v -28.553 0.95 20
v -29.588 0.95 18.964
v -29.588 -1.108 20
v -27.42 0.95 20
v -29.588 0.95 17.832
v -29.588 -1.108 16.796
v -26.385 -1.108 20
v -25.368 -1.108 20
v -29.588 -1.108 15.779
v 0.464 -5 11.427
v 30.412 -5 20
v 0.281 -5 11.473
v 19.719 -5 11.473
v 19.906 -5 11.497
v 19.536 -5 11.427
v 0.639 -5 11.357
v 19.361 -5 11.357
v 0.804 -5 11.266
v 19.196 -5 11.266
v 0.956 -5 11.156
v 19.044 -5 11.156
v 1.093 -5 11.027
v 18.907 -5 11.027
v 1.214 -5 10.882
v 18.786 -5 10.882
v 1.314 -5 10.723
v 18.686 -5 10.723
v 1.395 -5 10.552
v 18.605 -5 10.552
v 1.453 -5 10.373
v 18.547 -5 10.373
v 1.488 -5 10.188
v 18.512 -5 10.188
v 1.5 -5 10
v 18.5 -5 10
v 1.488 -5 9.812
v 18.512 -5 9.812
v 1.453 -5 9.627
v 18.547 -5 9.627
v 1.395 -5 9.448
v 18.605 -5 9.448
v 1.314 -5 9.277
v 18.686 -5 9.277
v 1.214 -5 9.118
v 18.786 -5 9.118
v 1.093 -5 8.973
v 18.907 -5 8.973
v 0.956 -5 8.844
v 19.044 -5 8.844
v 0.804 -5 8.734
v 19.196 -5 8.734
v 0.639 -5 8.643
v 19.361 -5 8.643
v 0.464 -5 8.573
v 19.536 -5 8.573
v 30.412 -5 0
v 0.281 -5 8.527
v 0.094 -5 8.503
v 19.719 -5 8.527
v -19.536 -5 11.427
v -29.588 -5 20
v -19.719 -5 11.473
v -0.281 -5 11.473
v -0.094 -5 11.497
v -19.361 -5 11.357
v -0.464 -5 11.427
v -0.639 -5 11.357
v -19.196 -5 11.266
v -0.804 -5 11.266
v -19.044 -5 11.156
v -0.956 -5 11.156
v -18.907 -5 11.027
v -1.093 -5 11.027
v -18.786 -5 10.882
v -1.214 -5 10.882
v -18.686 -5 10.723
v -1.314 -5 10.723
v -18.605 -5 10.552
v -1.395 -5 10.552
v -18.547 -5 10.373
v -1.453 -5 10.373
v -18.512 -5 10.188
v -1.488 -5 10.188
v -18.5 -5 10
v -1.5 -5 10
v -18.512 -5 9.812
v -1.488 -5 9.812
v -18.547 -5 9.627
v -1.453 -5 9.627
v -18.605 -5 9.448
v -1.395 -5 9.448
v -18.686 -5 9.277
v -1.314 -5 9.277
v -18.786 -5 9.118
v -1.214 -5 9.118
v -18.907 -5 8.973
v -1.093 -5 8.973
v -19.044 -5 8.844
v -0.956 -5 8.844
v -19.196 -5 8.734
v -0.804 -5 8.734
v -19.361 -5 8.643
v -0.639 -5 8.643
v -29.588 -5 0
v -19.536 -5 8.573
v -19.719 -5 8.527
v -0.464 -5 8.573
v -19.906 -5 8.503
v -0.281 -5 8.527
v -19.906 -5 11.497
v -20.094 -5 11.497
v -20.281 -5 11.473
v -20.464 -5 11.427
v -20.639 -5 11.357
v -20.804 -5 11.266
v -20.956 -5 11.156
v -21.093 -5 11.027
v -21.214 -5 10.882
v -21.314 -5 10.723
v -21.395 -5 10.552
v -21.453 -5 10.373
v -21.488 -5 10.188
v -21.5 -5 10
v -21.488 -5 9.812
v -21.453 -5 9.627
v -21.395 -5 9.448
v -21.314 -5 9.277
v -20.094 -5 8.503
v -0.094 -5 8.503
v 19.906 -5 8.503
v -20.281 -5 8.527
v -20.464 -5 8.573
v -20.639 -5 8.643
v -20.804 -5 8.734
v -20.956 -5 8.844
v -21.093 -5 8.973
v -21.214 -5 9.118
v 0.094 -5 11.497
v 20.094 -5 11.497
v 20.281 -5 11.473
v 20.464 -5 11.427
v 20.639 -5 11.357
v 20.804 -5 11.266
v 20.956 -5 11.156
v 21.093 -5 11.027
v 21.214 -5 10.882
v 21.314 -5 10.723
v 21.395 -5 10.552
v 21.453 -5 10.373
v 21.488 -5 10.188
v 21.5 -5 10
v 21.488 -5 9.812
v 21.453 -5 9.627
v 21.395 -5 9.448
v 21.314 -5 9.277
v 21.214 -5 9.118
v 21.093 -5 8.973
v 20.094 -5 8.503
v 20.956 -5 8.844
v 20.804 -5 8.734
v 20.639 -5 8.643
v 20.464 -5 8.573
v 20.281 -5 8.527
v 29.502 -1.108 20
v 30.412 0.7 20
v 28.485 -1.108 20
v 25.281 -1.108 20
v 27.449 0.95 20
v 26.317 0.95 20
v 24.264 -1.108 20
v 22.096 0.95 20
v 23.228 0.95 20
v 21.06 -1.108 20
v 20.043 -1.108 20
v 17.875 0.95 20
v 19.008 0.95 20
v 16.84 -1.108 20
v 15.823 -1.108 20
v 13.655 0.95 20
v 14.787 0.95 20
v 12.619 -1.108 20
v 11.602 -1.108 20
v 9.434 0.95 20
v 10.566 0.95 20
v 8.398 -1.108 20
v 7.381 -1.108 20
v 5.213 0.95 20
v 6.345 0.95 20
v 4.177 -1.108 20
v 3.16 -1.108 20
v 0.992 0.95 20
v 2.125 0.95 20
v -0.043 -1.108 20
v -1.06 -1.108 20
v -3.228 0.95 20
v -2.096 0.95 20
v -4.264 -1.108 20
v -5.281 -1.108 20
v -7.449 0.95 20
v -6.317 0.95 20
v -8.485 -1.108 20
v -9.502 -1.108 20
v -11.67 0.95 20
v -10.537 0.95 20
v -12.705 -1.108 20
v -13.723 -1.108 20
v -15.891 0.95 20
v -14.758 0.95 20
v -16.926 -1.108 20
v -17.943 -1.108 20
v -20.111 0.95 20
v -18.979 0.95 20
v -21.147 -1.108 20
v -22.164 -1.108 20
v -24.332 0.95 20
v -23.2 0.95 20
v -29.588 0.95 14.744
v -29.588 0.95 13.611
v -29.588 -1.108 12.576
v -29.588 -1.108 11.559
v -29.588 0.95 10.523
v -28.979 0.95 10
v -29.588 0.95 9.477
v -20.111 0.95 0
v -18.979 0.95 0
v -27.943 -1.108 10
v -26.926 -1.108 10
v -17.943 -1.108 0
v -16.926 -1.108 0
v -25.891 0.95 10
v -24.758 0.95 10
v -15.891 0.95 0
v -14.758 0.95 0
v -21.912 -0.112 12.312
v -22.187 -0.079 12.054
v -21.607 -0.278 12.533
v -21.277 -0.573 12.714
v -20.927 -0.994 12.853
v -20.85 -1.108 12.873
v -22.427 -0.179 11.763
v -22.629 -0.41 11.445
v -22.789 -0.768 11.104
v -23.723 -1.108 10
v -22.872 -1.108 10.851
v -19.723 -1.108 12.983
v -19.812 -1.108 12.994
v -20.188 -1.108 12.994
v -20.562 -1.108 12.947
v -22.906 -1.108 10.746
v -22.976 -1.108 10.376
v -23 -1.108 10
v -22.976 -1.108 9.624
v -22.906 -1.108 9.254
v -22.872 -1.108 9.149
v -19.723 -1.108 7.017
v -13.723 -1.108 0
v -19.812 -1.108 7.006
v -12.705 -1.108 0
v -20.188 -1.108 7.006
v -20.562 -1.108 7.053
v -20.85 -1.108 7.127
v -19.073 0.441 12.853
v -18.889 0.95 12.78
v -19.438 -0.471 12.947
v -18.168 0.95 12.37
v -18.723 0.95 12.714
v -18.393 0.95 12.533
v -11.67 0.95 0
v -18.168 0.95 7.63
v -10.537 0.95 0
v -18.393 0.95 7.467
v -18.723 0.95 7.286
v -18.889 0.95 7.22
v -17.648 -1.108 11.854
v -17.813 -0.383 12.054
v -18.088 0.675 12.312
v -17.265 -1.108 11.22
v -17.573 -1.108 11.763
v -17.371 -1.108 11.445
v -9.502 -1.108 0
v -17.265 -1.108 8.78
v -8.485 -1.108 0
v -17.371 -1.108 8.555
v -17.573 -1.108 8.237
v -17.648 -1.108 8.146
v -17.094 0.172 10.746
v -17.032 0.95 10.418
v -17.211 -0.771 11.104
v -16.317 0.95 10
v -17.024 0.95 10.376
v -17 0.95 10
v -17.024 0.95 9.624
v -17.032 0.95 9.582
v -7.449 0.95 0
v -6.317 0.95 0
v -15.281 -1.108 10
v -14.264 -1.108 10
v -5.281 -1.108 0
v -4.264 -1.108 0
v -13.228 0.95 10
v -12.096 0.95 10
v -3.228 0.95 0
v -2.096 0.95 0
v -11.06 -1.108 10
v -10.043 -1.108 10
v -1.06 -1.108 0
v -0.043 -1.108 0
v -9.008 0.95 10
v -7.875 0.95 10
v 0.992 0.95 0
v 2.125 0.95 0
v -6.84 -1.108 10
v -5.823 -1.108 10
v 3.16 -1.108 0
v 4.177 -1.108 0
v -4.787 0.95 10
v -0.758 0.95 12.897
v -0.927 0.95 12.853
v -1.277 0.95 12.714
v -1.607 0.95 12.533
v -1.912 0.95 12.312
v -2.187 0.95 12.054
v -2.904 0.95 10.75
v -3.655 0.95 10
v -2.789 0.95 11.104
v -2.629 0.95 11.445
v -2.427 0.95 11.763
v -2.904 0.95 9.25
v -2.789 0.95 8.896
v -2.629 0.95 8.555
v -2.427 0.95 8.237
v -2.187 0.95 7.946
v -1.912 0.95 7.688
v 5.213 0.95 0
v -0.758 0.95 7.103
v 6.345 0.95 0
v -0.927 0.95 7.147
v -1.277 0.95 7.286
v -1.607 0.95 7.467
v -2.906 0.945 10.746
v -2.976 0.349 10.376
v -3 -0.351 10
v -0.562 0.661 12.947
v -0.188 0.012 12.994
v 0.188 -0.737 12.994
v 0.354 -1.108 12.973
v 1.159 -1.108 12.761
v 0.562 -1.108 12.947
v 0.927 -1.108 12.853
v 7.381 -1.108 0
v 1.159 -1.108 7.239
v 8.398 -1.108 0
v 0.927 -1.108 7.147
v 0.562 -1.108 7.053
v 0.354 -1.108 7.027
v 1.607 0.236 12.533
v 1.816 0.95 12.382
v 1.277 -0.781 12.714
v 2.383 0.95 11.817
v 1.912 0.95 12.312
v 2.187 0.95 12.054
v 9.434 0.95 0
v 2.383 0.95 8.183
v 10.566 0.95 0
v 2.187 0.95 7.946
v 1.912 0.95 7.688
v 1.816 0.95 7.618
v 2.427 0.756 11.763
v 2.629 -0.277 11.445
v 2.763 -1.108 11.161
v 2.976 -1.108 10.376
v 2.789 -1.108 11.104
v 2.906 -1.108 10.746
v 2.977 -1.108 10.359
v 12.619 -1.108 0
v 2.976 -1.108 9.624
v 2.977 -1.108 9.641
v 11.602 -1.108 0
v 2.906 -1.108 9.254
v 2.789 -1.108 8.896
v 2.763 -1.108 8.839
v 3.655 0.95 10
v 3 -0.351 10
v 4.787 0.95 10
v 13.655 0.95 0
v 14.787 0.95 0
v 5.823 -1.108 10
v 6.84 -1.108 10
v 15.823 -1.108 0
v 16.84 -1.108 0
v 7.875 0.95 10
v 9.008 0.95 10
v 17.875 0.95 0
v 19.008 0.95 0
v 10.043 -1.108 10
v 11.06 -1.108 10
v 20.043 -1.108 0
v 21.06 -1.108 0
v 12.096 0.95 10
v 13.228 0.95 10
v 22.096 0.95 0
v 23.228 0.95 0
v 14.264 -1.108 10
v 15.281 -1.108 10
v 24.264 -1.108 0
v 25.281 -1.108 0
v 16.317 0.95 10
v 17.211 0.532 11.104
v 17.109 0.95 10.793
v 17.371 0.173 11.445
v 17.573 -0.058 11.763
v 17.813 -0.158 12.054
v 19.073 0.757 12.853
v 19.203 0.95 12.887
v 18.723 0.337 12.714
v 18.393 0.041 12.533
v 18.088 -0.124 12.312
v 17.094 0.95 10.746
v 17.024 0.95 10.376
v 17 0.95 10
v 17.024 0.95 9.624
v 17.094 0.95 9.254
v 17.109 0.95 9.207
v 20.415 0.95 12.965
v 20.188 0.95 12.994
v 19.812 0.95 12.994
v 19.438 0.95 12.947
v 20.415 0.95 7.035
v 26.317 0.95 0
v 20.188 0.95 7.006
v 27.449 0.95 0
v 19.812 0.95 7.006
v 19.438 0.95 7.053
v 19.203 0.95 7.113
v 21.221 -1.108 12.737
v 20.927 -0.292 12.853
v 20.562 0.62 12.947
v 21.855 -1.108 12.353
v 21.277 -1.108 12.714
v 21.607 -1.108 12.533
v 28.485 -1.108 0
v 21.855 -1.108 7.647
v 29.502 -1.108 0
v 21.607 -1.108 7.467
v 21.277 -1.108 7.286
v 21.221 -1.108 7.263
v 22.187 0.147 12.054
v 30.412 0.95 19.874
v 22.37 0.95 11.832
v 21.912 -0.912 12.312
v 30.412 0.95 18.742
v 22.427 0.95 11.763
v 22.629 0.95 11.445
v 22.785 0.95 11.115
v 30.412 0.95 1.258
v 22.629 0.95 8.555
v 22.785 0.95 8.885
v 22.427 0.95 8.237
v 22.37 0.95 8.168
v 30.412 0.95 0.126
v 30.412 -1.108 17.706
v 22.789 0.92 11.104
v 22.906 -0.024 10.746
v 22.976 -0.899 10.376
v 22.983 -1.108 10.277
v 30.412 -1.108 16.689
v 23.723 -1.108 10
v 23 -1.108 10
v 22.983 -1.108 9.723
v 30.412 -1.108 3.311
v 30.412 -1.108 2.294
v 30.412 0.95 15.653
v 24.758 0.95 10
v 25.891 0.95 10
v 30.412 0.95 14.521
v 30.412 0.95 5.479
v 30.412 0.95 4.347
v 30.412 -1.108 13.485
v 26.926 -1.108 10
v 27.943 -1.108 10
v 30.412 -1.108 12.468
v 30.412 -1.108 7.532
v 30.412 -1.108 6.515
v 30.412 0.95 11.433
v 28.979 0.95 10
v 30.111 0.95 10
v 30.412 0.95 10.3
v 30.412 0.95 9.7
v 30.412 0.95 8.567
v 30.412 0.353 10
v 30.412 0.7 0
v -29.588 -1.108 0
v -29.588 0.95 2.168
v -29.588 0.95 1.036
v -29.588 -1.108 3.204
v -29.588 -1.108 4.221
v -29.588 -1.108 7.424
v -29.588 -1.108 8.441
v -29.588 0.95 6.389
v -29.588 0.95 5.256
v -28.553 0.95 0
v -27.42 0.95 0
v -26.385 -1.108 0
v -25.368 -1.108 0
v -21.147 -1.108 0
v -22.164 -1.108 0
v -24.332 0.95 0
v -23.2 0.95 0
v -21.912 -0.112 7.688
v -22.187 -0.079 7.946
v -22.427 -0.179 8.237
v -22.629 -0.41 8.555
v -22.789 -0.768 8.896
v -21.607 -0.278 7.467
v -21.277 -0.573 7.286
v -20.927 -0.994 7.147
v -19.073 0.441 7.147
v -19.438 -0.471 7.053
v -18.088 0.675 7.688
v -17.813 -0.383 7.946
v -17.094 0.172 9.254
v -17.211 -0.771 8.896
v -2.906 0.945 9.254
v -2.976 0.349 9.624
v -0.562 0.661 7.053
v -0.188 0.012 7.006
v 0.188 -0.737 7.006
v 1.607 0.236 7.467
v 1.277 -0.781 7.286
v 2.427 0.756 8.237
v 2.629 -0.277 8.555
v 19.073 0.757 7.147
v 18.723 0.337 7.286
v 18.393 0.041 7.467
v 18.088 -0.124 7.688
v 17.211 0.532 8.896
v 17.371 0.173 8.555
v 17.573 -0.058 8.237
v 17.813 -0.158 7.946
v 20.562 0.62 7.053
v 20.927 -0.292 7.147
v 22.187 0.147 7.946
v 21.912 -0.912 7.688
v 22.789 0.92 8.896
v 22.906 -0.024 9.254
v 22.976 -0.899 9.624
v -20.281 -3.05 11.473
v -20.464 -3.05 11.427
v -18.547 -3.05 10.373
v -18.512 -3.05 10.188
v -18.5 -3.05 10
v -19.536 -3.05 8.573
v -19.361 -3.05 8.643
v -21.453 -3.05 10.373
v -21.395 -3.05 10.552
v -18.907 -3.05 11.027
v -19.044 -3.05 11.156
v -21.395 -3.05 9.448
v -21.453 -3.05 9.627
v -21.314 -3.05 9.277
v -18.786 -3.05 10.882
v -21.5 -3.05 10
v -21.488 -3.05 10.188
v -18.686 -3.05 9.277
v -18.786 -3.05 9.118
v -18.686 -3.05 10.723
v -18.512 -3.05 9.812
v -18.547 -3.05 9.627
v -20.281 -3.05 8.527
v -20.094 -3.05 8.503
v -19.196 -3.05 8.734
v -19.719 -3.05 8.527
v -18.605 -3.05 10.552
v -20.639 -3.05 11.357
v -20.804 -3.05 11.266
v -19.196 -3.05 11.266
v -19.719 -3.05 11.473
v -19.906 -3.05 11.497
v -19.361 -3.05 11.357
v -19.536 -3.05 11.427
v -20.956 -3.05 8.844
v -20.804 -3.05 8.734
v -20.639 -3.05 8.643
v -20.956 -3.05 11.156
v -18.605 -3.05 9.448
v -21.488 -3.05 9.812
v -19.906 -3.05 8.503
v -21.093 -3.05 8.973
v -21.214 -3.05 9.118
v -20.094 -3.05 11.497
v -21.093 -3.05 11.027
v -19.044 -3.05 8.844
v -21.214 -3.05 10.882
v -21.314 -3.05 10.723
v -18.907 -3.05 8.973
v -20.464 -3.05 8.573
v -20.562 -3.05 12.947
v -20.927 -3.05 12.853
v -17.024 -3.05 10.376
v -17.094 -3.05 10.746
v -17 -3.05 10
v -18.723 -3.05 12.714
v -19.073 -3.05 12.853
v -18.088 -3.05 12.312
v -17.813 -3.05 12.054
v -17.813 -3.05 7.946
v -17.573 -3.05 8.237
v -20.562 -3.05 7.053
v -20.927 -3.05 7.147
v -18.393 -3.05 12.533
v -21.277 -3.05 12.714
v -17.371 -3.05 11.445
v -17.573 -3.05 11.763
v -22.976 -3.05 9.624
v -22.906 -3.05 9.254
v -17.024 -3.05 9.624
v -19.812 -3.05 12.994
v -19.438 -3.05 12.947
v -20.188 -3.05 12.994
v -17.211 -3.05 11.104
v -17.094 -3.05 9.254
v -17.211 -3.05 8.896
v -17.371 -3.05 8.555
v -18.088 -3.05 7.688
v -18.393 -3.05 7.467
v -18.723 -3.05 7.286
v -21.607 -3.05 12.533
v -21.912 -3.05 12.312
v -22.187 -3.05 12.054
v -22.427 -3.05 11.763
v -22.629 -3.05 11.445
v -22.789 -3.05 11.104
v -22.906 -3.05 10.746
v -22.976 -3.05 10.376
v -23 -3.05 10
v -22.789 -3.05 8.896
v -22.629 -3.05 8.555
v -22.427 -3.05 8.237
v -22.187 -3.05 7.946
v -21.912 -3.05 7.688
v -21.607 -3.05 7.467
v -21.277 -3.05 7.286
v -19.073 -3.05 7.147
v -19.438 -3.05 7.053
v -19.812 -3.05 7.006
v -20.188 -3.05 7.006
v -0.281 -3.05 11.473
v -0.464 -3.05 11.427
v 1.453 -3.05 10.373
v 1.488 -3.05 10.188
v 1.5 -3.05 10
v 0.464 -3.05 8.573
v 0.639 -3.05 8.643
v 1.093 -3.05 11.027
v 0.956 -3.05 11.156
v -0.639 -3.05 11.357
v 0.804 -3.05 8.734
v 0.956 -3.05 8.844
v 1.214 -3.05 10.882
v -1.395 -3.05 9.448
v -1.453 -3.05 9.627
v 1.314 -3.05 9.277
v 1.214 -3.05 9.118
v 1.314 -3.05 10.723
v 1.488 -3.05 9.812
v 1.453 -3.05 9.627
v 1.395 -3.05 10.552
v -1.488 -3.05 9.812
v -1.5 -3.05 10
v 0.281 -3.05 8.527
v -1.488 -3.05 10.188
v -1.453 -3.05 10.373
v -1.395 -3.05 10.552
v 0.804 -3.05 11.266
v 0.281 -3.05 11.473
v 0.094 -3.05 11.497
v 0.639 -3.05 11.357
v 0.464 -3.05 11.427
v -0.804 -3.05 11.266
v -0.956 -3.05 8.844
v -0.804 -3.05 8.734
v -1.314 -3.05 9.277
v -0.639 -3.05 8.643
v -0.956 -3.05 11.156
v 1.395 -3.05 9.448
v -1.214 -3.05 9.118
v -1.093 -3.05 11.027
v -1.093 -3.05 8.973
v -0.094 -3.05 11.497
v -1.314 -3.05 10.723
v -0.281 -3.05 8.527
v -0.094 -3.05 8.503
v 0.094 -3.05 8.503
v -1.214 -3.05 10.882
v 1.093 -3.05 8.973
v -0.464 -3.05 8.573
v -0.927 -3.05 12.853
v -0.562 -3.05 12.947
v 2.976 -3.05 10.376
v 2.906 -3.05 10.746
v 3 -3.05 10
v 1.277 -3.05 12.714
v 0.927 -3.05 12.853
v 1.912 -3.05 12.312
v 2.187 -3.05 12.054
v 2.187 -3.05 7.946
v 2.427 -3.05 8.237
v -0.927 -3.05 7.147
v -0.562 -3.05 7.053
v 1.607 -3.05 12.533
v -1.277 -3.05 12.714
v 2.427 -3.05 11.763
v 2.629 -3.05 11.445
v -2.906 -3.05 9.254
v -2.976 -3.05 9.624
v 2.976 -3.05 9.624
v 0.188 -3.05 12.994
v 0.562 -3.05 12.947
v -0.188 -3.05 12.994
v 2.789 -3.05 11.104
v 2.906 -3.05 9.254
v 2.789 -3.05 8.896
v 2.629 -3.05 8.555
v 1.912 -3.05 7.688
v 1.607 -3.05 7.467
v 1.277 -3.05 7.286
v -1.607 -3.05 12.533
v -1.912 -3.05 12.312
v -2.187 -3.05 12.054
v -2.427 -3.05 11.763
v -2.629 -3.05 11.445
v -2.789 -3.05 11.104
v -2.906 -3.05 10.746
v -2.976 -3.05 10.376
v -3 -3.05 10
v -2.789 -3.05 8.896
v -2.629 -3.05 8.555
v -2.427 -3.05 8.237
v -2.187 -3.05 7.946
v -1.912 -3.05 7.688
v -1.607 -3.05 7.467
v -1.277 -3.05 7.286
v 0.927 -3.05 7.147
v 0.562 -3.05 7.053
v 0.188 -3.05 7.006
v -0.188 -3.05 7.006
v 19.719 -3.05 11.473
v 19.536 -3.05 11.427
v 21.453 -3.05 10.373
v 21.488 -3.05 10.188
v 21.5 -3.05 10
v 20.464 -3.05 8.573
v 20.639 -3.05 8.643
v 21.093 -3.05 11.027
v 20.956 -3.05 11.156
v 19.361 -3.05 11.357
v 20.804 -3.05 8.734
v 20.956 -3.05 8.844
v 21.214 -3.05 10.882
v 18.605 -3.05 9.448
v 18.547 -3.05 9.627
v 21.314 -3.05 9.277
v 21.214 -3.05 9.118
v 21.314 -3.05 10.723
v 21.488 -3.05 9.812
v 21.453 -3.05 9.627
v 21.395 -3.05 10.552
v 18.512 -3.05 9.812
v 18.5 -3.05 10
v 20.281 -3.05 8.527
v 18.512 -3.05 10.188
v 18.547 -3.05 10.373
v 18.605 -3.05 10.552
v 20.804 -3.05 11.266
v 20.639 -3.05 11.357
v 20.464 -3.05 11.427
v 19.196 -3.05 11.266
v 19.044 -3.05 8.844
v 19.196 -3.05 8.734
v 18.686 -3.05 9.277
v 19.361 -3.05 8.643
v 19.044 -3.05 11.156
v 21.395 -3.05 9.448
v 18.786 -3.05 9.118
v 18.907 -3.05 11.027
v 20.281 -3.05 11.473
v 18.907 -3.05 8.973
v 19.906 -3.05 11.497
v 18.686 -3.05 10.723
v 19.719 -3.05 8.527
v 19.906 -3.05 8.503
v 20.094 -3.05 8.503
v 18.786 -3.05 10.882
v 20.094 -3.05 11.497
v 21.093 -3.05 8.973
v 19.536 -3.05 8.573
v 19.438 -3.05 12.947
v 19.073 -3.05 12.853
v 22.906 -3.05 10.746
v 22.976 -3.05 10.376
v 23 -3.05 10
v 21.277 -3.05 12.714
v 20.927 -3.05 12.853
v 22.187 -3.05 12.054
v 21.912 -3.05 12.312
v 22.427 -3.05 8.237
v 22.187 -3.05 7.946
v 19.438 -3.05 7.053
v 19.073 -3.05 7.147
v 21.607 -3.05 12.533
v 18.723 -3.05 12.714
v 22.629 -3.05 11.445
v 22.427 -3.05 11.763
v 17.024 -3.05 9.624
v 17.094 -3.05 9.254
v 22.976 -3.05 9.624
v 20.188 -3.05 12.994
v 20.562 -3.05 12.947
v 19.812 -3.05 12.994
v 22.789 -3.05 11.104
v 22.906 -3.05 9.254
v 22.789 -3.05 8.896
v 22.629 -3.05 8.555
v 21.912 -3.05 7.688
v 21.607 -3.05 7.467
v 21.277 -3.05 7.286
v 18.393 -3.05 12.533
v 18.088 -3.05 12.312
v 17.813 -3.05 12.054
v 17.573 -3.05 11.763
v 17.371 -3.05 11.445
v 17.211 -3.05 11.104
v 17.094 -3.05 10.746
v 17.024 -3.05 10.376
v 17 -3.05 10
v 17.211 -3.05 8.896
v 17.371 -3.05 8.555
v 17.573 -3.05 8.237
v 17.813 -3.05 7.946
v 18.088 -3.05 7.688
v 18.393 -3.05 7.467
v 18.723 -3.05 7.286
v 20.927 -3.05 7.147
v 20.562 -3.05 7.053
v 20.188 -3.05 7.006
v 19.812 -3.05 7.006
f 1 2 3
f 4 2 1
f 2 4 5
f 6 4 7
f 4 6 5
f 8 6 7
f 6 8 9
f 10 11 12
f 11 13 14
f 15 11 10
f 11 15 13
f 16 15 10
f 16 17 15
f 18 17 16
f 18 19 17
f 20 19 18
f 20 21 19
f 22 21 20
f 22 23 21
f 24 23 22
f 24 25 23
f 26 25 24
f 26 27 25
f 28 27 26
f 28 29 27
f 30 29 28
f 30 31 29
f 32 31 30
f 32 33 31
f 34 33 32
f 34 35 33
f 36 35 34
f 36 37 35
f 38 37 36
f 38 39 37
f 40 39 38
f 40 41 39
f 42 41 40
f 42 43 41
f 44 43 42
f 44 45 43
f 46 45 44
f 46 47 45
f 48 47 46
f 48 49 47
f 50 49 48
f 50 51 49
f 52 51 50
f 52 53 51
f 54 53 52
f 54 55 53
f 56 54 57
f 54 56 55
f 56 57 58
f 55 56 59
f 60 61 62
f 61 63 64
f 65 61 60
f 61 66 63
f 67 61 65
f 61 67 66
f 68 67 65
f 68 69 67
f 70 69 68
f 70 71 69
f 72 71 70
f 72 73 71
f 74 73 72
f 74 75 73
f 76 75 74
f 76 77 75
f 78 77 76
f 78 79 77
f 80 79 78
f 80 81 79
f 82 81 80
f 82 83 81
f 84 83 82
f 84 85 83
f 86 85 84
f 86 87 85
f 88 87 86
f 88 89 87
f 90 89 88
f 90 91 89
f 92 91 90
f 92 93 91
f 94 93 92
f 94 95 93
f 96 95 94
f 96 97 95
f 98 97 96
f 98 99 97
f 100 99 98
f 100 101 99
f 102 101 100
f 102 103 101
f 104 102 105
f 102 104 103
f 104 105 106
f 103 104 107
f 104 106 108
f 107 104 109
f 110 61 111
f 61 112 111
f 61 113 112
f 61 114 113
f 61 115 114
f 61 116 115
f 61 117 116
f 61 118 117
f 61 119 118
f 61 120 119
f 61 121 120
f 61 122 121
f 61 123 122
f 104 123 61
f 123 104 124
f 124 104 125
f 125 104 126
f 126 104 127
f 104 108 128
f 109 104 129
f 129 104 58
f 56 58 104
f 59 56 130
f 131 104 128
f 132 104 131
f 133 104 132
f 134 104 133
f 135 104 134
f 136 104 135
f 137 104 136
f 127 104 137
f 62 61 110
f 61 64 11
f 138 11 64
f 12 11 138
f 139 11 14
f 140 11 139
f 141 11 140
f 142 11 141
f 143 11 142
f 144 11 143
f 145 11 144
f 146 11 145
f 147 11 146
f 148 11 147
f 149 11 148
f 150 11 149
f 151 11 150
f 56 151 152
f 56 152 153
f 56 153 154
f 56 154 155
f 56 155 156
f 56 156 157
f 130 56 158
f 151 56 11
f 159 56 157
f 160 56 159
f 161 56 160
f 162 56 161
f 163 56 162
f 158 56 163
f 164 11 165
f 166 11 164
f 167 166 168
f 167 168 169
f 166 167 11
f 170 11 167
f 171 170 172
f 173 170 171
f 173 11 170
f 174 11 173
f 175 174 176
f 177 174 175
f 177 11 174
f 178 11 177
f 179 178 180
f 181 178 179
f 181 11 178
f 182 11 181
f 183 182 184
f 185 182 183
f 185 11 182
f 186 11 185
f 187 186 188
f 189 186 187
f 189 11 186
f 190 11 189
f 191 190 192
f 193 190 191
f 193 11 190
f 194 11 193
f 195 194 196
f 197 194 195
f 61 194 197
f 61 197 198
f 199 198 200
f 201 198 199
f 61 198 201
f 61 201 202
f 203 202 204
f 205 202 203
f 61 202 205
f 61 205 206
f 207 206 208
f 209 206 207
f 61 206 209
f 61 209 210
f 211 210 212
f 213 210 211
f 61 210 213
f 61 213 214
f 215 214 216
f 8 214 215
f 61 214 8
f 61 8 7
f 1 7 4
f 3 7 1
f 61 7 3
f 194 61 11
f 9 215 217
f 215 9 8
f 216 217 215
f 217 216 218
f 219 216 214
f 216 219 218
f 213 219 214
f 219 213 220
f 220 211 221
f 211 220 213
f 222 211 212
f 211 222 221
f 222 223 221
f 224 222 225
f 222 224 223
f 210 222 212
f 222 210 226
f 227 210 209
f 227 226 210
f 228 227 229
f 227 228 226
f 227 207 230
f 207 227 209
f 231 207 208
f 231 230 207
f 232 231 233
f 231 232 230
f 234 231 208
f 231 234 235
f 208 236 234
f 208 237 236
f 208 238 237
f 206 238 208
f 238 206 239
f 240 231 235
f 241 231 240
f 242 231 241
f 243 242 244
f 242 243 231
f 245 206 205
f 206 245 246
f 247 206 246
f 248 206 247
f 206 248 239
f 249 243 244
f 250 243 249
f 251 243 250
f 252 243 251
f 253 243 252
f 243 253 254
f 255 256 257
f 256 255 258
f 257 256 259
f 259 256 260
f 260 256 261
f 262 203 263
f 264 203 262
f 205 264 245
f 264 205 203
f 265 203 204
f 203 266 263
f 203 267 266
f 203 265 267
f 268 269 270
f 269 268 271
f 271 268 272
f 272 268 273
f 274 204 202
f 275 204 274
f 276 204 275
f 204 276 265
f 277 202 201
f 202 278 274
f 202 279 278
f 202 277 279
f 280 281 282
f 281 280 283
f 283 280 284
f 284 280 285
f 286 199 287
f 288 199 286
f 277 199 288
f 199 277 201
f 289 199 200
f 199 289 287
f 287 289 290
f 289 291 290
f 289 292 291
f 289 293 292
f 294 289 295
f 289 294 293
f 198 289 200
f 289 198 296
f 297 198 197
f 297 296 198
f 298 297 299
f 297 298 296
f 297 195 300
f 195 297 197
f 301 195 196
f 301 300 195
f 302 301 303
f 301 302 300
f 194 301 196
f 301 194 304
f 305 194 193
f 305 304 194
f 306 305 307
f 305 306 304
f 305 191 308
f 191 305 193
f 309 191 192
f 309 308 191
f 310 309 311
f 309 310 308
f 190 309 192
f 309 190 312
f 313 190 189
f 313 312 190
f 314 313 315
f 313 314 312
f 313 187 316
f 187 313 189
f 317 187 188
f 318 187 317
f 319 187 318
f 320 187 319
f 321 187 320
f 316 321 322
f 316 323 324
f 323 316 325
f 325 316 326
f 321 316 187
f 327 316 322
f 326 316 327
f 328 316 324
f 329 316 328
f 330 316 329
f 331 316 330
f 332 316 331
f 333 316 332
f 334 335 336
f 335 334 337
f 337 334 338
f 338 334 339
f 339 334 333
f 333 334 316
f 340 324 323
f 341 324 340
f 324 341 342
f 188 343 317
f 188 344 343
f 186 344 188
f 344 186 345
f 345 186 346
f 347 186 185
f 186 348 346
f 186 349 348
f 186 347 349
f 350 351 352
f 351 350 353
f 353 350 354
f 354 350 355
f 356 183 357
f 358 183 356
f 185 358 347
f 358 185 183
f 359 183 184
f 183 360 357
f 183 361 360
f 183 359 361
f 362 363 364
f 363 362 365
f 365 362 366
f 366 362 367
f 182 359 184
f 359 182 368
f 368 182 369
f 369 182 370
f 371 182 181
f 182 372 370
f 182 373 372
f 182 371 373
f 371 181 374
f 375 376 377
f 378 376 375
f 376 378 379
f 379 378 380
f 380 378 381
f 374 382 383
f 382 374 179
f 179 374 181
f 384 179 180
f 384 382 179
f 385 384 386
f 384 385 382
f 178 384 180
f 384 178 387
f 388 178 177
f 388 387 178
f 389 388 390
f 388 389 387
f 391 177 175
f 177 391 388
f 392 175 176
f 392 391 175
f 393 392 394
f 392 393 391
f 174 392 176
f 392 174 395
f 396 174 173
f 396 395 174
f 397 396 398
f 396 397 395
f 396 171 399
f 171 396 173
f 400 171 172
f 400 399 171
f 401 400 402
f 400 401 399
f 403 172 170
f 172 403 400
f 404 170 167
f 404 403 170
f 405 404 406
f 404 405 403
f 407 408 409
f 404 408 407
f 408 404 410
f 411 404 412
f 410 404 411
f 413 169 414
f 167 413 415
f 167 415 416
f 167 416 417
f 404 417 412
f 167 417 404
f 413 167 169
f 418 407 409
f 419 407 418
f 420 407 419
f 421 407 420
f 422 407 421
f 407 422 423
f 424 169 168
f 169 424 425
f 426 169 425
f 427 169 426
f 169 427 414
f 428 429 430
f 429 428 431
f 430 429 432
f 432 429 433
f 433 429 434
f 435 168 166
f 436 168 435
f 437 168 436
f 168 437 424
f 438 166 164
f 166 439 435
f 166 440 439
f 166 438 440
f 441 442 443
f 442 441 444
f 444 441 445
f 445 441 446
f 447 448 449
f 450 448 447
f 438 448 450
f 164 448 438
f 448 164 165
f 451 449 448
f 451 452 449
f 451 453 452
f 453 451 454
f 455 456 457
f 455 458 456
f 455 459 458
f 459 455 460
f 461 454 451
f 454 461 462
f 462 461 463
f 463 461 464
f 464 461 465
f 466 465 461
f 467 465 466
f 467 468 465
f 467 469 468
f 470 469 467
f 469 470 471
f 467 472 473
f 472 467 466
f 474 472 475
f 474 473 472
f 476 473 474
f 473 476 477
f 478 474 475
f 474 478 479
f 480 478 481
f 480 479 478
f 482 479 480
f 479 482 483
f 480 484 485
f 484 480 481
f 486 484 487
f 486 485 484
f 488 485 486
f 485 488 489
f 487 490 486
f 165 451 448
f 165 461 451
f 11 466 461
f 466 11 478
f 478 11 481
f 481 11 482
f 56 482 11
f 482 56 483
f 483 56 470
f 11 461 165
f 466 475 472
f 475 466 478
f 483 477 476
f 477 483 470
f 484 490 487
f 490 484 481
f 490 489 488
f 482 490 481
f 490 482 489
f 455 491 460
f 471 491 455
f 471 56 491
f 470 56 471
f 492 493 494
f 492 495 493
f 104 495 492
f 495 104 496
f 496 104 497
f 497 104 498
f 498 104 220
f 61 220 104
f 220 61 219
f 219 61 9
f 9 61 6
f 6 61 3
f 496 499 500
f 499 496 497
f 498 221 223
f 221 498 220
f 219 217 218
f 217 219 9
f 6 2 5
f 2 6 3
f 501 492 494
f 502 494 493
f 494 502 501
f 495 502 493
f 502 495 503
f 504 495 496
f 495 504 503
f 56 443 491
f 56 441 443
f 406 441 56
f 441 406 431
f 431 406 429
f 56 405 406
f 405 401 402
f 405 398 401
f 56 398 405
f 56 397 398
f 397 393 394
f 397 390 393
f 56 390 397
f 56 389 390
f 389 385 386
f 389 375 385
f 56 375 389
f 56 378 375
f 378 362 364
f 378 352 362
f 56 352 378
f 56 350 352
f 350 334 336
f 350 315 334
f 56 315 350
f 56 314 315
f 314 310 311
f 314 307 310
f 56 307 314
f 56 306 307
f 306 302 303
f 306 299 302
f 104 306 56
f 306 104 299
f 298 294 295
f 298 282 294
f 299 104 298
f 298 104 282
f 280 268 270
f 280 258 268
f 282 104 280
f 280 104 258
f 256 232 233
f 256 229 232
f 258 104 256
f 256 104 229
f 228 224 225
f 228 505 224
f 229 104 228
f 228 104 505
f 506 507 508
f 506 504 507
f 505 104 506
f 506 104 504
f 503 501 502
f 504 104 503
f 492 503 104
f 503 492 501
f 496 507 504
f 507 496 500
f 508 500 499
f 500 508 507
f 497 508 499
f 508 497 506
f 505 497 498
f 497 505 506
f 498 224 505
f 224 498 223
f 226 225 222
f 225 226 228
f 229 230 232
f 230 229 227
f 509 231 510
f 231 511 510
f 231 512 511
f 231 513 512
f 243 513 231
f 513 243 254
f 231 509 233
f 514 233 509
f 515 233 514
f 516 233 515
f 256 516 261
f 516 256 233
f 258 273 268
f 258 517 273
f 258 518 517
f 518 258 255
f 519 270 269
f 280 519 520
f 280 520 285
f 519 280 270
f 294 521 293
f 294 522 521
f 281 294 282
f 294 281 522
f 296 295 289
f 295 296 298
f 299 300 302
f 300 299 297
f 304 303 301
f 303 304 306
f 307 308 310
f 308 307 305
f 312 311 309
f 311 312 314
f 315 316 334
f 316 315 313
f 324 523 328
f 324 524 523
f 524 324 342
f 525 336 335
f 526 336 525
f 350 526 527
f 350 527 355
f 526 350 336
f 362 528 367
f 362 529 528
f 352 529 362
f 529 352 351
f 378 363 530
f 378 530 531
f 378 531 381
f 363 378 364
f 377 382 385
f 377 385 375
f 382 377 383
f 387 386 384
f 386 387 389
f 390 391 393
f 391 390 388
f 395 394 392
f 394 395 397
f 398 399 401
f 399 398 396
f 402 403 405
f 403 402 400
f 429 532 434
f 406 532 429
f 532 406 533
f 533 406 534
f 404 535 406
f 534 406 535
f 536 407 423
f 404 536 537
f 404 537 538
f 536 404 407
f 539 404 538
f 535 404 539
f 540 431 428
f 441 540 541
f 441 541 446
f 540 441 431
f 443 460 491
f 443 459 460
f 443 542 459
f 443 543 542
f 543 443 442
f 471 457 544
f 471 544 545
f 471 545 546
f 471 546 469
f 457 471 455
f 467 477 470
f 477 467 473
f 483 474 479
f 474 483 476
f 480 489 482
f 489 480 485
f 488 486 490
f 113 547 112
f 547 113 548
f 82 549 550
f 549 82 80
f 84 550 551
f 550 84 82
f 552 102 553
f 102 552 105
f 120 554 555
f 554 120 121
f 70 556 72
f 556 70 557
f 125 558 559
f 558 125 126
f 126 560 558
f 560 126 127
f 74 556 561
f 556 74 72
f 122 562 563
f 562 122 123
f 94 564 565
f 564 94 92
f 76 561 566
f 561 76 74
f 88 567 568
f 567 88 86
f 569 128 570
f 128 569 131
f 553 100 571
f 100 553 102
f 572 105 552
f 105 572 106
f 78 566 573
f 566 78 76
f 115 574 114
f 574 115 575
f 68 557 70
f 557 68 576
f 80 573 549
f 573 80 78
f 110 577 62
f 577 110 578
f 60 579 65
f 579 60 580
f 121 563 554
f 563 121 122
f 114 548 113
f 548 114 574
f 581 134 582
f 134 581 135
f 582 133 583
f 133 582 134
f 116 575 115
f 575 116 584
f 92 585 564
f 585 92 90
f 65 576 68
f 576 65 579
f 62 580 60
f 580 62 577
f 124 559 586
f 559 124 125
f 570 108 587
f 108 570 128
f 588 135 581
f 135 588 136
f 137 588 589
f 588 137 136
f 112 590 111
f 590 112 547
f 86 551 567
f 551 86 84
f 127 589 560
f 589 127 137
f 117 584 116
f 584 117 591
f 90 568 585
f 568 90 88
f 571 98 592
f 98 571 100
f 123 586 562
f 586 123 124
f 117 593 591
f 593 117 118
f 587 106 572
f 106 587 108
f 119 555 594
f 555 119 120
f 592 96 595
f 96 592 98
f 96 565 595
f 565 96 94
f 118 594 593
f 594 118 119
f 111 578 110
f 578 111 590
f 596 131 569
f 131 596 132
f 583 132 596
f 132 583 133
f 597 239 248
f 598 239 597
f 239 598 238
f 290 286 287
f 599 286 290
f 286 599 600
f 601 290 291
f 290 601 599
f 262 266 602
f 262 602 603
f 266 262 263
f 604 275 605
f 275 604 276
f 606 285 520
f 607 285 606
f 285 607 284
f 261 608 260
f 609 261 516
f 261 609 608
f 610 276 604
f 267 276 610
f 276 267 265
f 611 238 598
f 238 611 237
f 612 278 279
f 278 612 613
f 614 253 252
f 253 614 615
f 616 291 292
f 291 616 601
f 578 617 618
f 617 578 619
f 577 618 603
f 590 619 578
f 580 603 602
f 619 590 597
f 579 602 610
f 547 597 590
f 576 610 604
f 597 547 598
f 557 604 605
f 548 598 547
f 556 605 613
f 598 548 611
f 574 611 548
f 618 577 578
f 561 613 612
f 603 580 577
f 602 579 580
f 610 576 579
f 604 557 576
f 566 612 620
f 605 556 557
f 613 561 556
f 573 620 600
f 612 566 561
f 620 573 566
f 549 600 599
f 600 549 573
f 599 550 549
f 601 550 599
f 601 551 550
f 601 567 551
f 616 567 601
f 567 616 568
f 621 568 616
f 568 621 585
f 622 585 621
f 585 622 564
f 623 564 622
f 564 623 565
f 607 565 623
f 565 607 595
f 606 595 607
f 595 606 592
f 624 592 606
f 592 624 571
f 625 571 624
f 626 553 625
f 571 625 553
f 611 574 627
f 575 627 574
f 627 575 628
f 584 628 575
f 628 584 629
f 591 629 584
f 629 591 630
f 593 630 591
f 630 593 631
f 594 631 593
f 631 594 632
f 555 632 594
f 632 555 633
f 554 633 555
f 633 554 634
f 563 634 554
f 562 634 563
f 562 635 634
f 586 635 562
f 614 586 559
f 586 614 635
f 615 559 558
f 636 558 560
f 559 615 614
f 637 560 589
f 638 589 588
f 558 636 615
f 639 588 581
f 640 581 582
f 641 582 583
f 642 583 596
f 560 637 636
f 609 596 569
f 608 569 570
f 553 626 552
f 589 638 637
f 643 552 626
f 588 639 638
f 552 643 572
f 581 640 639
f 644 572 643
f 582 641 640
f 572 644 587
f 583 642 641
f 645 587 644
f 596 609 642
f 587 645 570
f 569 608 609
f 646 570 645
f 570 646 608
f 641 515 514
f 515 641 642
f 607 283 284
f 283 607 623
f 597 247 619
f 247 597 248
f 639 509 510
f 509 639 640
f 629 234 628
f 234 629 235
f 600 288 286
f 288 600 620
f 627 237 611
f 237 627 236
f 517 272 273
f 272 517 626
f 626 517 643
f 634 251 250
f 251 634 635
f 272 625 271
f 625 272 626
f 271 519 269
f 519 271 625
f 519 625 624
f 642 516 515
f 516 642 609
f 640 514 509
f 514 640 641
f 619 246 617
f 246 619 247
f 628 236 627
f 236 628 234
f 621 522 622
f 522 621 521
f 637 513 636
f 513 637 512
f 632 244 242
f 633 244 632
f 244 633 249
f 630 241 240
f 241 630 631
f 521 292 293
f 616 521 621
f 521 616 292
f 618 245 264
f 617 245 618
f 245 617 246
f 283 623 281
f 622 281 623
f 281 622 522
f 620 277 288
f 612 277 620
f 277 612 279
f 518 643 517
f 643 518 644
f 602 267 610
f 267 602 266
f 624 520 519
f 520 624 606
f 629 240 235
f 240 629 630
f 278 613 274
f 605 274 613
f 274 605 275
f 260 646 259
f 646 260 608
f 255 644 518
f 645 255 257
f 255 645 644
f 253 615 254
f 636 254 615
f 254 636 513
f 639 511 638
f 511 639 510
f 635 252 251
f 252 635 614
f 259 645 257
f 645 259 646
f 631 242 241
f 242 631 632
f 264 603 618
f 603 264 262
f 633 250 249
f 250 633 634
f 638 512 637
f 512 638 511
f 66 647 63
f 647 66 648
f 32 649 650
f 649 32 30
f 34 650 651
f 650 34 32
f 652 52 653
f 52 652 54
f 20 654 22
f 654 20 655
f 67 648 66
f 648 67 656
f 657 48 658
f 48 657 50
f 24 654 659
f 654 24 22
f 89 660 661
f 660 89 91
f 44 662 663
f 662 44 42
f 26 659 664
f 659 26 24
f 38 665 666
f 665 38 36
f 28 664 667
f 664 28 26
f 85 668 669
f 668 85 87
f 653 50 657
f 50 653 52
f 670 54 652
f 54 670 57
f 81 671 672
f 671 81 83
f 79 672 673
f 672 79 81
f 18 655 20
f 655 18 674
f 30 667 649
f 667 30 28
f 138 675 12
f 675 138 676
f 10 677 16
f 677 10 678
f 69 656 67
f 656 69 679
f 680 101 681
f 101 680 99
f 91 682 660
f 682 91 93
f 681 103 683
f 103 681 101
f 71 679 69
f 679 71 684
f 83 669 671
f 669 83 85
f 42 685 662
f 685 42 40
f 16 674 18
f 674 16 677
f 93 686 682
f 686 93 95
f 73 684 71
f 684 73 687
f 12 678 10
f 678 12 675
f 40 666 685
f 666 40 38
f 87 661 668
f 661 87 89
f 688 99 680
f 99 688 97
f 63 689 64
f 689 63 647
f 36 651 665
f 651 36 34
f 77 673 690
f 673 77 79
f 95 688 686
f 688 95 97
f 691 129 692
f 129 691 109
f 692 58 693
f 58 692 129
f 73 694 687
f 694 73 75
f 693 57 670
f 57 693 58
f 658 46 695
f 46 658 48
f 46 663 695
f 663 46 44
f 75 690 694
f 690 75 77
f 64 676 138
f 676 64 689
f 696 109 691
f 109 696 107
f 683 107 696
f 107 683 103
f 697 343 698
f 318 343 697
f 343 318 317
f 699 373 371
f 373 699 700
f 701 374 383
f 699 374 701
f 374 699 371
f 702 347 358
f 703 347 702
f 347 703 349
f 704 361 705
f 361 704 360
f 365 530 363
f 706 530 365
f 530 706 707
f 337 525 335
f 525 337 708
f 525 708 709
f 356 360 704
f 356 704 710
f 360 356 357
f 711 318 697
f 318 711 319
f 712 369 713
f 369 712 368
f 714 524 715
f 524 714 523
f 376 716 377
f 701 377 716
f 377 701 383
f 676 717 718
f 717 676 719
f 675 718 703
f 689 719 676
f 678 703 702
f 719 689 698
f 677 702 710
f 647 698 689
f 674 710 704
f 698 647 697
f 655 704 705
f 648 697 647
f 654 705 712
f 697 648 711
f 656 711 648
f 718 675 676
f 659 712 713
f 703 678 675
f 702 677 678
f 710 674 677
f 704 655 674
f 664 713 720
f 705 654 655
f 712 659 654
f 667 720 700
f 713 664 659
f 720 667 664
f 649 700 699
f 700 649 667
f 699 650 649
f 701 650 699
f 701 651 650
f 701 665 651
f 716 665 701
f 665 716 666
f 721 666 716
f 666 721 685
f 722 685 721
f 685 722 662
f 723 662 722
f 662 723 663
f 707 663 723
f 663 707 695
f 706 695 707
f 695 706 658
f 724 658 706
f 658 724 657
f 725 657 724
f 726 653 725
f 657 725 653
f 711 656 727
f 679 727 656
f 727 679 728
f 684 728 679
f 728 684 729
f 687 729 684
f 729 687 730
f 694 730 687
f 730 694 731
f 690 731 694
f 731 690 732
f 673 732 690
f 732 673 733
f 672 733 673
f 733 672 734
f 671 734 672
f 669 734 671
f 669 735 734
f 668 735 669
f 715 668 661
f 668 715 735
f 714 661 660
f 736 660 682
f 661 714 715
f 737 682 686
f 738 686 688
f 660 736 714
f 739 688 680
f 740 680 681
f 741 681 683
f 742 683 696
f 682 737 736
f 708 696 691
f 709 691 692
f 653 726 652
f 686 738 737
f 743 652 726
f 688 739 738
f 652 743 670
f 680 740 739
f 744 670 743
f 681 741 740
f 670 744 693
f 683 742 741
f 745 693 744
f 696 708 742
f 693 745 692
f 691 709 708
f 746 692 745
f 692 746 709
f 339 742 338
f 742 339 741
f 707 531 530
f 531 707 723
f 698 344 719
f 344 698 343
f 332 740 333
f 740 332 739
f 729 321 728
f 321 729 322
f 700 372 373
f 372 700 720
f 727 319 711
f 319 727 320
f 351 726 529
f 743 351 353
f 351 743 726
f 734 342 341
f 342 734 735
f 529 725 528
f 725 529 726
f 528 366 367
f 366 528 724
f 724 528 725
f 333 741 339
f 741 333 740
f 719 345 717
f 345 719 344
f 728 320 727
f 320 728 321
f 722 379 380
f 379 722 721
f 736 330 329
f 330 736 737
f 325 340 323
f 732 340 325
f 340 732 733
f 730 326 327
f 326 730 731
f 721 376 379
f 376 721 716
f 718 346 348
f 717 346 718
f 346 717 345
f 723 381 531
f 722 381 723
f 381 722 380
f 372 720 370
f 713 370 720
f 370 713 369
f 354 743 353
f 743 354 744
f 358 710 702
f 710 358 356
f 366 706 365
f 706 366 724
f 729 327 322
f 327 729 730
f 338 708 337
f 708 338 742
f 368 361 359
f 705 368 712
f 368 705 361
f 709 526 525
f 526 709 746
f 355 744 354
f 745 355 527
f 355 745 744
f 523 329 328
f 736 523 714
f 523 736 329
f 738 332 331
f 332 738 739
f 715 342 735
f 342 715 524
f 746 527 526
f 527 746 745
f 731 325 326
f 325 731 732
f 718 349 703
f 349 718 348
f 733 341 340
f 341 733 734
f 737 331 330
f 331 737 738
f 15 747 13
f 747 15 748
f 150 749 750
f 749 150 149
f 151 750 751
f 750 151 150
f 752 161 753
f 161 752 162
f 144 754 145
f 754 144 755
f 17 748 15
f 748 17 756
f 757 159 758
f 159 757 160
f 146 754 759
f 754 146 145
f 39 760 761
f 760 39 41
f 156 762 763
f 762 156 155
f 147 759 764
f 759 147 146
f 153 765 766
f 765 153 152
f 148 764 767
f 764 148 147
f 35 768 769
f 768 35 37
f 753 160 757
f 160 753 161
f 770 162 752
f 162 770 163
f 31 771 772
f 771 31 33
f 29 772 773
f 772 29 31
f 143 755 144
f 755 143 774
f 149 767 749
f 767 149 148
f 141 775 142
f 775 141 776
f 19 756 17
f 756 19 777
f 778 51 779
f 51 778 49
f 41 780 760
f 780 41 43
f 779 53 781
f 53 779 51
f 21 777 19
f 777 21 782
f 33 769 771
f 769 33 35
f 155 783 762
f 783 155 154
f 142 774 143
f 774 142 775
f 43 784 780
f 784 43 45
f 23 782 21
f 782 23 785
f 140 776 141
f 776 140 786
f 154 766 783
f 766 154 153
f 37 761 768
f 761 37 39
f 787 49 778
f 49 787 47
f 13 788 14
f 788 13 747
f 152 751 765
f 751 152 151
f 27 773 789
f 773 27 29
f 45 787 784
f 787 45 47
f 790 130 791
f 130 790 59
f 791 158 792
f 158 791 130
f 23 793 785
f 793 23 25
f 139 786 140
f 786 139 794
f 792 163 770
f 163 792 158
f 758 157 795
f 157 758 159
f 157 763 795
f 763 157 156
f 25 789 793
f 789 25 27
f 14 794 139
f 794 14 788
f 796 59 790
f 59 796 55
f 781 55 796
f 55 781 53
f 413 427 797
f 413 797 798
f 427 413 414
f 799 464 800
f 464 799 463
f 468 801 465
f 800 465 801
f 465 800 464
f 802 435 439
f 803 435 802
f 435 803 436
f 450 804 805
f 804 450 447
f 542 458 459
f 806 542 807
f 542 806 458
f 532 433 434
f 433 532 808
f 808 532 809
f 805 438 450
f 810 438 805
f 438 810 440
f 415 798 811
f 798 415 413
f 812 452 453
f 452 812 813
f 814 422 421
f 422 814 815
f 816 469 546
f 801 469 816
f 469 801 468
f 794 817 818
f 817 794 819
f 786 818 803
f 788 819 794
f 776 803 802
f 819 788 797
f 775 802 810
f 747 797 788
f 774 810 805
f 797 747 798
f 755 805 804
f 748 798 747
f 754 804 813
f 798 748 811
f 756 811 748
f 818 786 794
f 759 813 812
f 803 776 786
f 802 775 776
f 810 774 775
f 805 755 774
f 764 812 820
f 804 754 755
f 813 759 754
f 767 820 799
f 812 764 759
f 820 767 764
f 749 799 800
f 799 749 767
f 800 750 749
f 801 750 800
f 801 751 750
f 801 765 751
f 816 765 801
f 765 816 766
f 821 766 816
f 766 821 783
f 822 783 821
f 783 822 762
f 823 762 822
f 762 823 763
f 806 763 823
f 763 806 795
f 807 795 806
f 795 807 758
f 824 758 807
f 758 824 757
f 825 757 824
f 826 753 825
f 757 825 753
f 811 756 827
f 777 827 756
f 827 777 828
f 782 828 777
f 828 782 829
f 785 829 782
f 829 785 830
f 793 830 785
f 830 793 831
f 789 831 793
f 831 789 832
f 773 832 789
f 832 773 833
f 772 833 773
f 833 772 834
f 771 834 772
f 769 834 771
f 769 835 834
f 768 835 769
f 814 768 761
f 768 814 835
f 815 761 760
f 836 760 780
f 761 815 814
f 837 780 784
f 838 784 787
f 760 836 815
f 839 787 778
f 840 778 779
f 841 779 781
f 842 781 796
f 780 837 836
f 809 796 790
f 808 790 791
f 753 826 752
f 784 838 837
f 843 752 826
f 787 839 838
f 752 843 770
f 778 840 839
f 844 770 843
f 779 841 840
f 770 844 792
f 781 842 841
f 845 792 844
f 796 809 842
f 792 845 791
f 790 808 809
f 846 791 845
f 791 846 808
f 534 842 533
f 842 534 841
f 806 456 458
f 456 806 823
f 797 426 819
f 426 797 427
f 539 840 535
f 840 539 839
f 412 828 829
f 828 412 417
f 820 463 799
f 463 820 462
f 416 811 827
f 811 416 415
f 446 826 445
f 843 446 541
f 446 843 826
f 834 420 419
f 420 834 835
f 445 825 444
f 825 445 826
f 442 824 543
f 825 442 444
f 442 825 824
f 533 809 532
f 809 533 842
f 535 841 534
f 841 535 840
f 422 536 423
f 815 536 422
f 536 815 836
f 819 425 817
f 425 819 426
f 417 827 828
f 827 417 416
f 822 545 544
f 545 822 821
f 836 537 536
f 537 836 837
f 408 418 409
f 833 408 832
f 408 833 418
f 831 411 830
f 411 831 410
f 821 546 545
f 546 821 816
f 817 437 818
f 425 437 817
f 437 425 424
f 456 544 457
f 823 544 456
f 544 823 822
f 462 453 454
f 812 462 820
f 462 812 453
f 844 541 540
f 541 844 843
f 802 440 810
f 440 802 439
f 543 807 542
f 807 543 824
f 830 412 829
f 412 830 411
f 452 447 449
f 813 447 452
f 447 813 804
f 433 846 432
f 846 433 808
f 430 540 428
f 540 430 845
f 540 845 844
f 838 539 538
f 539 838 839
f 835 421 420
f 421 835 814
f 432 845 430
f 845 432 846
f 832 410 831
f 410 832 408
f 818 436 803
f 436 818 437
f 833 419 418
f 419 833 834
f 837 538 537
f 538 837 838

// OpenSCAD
include <../gears.scad>

mountable_herringbone_rack(modul=1, length=60, height=5, width=20, pressure_angle=20, helix_angle=45, profile=3, head="PH", fastners=3);
